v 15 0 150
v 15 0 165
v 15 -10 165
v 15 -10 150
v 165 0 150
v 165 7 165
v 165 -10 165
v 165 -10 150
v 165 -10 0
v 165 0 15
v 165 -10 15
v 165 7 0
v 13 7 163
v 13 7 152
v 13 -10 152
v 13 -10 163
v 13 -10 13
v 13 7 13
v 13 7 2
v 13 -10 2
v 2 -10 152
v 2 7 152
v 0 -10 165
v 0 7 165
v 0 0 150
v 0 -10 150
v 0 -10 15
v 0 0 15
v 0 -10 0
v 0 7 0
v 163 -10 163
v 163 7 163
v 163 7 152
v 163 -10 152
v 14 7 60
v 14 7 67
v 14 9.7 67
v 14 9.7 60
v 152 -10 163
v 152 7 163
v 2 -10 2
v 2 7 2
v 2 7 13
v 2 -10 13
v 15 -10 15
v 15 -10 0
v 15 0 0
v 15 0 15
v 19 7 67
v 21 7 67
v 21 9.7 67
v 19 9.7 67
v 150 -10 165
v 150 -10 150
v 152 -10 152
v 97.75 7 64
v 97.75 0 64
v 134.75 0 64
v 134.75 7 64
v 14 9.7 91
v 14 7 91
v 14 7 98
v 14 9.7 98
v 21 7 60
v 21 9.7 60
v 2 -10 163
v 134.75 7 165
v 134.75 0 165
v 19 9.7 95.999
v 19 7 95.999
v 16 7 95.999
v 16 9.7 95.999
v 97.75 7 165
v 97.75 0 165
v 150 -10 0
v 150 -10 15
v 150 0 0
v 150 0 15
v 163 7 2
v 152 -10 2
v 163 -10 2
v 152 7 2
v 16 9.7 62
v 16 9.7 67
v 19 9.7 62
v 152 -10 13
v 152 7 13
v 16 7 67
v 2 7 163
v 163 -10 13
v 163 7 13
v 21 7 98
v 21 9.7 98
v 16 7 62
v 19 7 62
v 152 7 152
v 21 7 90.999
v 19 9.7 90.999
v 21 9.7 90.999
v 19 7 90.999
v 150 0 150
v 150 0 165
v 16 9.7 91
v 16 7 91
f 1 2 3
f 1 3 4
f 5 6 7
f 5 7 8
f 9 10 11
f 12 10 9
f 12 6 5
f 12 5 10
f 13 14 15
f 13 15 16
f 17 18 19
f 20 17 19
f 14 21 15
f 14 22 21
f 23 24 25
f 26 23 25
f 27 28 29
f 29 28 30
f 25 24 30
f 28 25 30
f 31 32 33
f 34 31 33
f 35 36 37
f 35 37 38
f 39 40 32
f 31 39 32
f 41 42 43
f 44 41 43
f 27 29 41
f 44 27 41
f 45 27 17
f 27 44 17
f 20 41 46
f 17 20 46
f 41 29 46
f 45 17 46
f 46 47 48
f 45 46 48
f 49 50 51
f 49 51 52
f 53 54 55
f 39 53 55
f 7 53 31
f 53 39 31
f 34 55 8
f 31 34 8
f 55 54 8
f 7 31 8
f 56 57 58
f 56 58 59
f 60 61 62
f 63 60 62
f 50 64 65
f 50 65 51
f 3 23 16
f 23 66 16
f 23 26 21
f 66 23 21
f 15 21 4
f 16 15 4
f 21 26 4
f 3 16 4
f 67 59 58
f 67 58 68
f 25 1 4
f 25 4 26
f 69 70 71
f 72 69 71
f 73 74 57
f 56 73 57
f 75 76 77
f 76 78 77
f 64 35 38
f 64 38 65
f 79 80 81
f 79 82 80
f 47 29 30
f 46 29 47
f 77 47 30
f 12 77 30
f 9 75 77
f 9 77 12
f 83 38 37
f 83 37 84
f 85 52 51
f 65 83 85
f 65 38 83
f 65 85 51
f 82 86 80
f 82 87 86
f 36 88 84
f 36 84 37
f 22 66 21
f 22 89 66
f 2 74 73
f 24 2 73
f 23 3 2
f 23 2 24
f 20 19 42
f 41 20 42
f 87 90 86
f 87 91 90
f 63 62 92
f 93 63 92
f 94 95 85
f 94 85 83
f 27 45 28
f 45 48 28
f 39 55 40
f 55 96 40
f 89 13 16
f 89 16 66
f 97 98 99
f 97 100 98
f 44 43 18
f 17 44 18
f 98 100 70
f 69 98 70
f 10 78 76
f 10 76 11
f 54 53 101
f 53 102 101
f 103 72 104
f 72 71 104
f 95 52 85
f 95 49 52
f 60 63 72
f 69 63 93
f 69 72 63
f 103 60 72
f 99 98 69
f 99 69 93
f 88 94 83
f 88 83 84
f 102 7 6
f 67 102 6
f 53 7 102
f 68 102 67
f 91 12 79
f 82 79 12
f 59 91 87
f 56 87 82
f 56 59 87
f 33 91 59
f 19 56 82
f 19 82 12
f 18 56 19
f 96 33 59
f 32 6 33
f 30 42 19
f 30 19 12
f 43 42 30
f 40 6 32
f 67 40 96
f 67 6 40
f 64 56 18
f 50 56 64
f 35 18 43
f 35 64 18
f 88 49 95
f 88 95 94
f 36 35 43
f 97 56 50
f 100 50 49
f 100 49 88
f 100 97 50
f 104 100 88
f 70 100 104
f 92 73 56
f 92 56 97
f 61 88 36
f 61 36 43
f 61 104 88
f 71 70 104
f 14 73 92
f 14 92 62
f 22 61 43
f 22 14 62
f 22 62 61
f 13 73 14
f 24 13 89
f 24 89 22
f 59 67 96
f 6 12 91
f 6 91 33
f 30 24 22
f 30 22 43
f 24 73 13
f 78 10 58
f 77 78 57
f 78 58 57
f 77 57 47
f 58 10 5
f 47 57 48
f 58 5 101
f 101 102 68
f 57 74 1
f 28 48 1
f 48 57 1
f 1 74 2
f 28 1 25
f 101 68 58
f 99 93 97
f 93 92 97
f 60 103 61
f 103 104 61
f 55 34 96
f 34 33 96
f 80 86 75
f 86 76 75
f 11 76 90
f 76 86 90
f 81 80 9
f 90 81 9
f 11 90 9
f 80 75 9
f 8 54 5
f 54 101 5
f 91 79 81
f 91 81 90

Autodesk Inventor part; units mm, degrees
ref_plane "YZ Plane" through (0, 0, 0) normal (1, 0, 0) x (0, 1, 0)
ref_plane "XZ Plane" through (0, 0, 0) normal (0, 1, 0) x (-1, 0, 0)
ref_plane "XY Plane" through (0, 0, 0) normal (0, 0, 1) x (1, 0, 0)
sketch "Sketch1" plane through (0, 0, 0) normal (0, 1, 0) x (-1, 0, 0)
  line L0 (0, 0) -> (-165, 0)
  line L1 (-165, 0) -> (-165, 165)
  line L2 (-165, 165) -> (0, 165)
  line L3 (0, 165) -> (0, 0)
  line L4 (-165, 165) -> (-150, 165)
  line L5 (-165, 150) -> (-165, 165)
  line L6 (-163, 152) -> (-152, 152)
  line L7 (-152, 152) -> (-152, 163)
  line L8 (-152, 163) -> (-163, 163)
  line L9 (-163, 163) -> (-163, 152)
  line L10 (-2, 152) -> (-13, 152)
  line L11 (-13, 152) -> (-13, 163)
  line L12 (-13, 163) -> (-2, 163)
  line L13 (-2, 163) -> (-2, 152)
  line L14 (-163, 13) -> (-152, 13)
  line L15 (-152, 13) -> (-152, 2)
  line L16 (-152, 2) -> (-163, 2)
  line L17 (-163, 2) -> (-163, 13)
  line L18 (-2, 13) -> (-13, 13)
  line L19 (-13, 13) -> (-13, 2)
  line L20 (-13, 2) -> (-2, 2)
  line L21 (-2, 2) -> (-2, 13)
  line L22 (-150, 150) -> (-165, 150)
  line L23 (-165, 150) -> (-165, 165)
  line L24 (-165, 165) -> (-150, 165)
  line L25 (-150, 165) -> (-150, 150)
  line L26 (-150, 15) -> (-165, 15)
  line L27 (-165, 15) -> (-165, 0)
  line L28 (-165, 0) -> (-150, 0)
  line L29 (-150, 0) -> (-150, 15)
  line L30 (-15, 15) -> (0, 15)
  line L31 (0, 15) -> (0, 0)
  line L32 (0, 0) -> (-15, 0)
  line L33 (-15, 0) -> (-15, 15)
  line L34 (-15, 150) -> (0, 150)
  line L35 (0, 150) -> (0, 165)
  line L36 (0, 165) -> (-15, 165)
  line L37 (-15, 165) -> (-15, 150)
  line L38 (-165, 165) -> (-133.75, 165)
  line L39 (-133.75, 165) -> (-97.75, 165)
  line L40 (-97.75, 165) -> (-97.75, 64)
  line L41 (-97.75, 64) -> (-133.75, 64)
  line L42 (-133.75, 64) -> (-133.75, 165)
  point P0 (0, 15)
  dimension "d0" = 165
  dimension "d1" = 165
  dimension "d5" = 2
  dimension "d6" = 2
  dimension "d7" = 2
  dimension "d8" = 2
  dimension "d9" = 31.25
  dimension "d10" = 36
  dimension "d11" = 101
extrude "Extrusion1" add sketch "Sketch1" along normal blind 7 contours L0 L29 L26 L1 L22 L25 L2 L42 L41 L40 L37 L34 L3 L30 L33
sketch "Sketch2" plane through (0, 7, 0) normal (0, 1, 0) x (1, 0, 0)
  line L0 (15, -15) -> (0, -15) projected
  line L1 (15, -15) -> (0, -15)
  line L2 (0, -15) -> (0, 0)
  line L3 (0, 0) -> (15, 0)
  line L4 (15, 0) -> (15, -15)
  line L5 (150, -15) -> (150, 0) projected
  line L6 (150, -15) -> (165, -15)
  line L7 (165, -15) -> (165, 0)
  line L8 (165, 0) -> (150, 0)
  line L9 (150, 0) -> (150, -15)
  line L10 (150, -150) -> (165, -150) projected
  line L11 (150, -150) -> (165, -150)
  line L12 (165, -150) -> (165, -165)
  line L13 (165, -165) -> (150, -165)
  line L14 (150, -165) -> (150, -150)
  line L15 (15, -150) -> (0, -150)
  line L16 (0, -150) -> (0, -165)
  line L17 (0, -165) -> (15, -165)
  line L18 (15, -165) -> (15, -150)
  line L19 (2, -163) -> (2, -152)
  line L20 (2, -152) -> (13, -152)
  line L21 (13, -152) -> (13, -163)
  line L22 (13, -163) -> (2, -163)
  line L23 (2, -2) -> (2, -13)
  line L24 (2, -13) -> (13, -13)
  line L25 (13, -13) -> (13, -2)
  line L26 (13, -2) -> (2, -2)
  line L27 (163, -2) -> (163, -13)
  line L28 (163, -13) -> (152, -13)
  line L29 (152, -13) -> (152, -2)
  line L30 (152, -2) -> (163, -2)
  line L31 (163, -163) -> (163, -152)
  line L32 (163, -152) -> (152, -152)
  line L33 (152, -152) -> (152, -163)
  line L34 (152, -163) -> (163, -163)
  dimension "d14" = 15
  dimension "d15" = 15
  dimension "d16" = 15
  dimension "d17" = 15
  dimension "d18" = 15
  dimension "d19" = 15
  dimension "d20" = 15
  dimension "d21" = 15
  dimension "d22" = 2
  dimension "d23" = 2
  dimension "d24" = 2
  dimension "d25" = 2
extrude "Extrusion2" add sketch "Sketch2" against normal blind 17
sketch "Sketch3" plane through (0, 7, 0) normal (0, 1, 0) x (1, 0, 0)
  point P0 (0, 0)
surface extrude "ExtrusionSrf1" sketch "Sketch2" against normal blind 37 shown yes curves L21 L22 L19 L20
surface extrude "ExtrusionSrf2" sketch "Sketch2" against normal blind 37 shown yes curves L27 L28 L29 L30
surface extrude "ExtrusionSrf3" sketch "Sketch2" against normal blind 37 shown yes curves L25 L26 L23 L24
surface extrude "ExtrusionSrf4" sketch "Sketch2" against normal blind 37 shown yes curves L31 L32 L33 L34
sketch "Sketch4" plane through (133.75, 0, 64) normal (-1, 0, 0) x (0, 0, 1)
  line L0 (0, 7) -> (101, 7) projected
  line L1 (101, 0) -> (101, 7) projected
  line L2 (0, 7) -> (101, 7)
  line L3 (101, 7) -> (101, 0)
  line L4 (101, 0) -> (0, 0)
  line L5 (0, 0) -> (0, 7)
  line L6 (0, 0) -> (0, 7) projected
  line L7 (0, 7) -> (101, 7)
  line L8 (101, 7) -> (101, 0)
  line L9 (101, 0) -> (0, 0)
  line L10 (0, 0) -> (0, 7)
  point P0 (-64, 0)
extrude "Extrusion3" cut sketch "Sketch4" against normal blind 1
sketch "Sketch5" plane through (0, 7, 0) normal (0, 1, 0) x (1, 0, 0)
  line L0 (13, -2) -> (13, -13) projected
  line L1 (0, 0) -> (0, -165) projected
  line L2 (16, -67) -> (19, -67)
  line L3 (19, -67) -> (19, -62)
  line L4 (19, -62) -> (16, -62)
  line L5 (16, -62) -> (16, -67)
  line L6 (21, -60) -> (21, -67)
  line L7 (14, -67) -> (14, -60)
  line L8 (14, -60) -> (21, -60)
  line L9 (21, -67) -> (14, -67)
  line L10 (19, -90.9991) -> (19, -95.9991)
  line L11 (19, -95.9991) -> (16, -95.9991)
  line L12 (16, -95.9991) -> (16, -90.9995)
  line L13 (21, -97.9995) -> (21, -90.9991)
  line L14 (14, -90.9995) -> (14, -97.9995)
  line L15 (14, -97.9995) -> (21, -97.9995)
  line L16 (19, -90.9991) -> (19, -95.9991)
  line L17 (16, -95.9991) -> (16, -90.9995)
  line L18 (14, -90.9995) -> (14, -97.9995)
  line L19 (21, -97.9995) -> (21, -90.9991)
  line L20 (19, -67) -> (21, -67)
  line L21 (21, -60) -> (14, -60)
  line L22 (14, -67) -> (16, -67)
  line L23 (16, -62) -> (19, -62)
  line L24 (19, -90.9991) -> (21, -90.9991)
  line L25 (16, -90.9995) -> (14, -90.9995)
  line L26 (14, -97.9995) -> (16, -97.9995)
  line L27 (16, -97.9995) -> (16, -90.9995)
  line L28 (16, -90.9995) -> (14, -90.9995)
  line L29 (14, -90.9995) -> (14, -97.9995)
  line L30 (16, -97.9995) -> (21, -97.9995)
  line L31 (21, -97.9995) -> (21, -95.9991)
  line L32 (21, -95.9991) -> (16, -95.9991)
  line L33 (16, -95.9991) -> (16, -97.9995)
  line L34 (21, -90.9991) -> (19, -90.9991)
  line L35 (19, -90.9991) -> (19, -95.9991)
  line L36 (19, -95.9991) -> (21, -95.9991)
  line L37 (21, -95.9991) -> (21, -90.9991)
  line L38 (19, -67) -> (21, -67)
  line L39 (21, -67) -> (21, -60)
  line L40 (21, -60) -> (19, -60)
  line L41 (19, -60) -> (19, -67)
  line L42 (19, -60) -> (14, -60)
  line L43 (14, -60) -> (14, -62)
  line L44 (14, -62) -> (19, -62)
  line L45 (19, -62) -> (19, -60)
  line L46 (16, -62) -> (14, -62)
  line L47 (14, -62) -> (14, -67)
  line L48 (14, -67) -> (16, -67)
  line L49 (16, -67) -> (16, -62)
  dimension "d42" = 3
  dimension "d43" = 5
  dimension "d44" = 2
extrude "Extrusion4" add sketch "Sketch5" along normal blind 2.7 contours L9 L7 L44 L5 | L3 L41 L8 L6 L9 | L44 L7 L8 L41 L4 | L24 L13 L32 L10 | L32 L13 L15 L27 L11 | L27 L15 L14 L25 L12
properties part number "piano superiore"
